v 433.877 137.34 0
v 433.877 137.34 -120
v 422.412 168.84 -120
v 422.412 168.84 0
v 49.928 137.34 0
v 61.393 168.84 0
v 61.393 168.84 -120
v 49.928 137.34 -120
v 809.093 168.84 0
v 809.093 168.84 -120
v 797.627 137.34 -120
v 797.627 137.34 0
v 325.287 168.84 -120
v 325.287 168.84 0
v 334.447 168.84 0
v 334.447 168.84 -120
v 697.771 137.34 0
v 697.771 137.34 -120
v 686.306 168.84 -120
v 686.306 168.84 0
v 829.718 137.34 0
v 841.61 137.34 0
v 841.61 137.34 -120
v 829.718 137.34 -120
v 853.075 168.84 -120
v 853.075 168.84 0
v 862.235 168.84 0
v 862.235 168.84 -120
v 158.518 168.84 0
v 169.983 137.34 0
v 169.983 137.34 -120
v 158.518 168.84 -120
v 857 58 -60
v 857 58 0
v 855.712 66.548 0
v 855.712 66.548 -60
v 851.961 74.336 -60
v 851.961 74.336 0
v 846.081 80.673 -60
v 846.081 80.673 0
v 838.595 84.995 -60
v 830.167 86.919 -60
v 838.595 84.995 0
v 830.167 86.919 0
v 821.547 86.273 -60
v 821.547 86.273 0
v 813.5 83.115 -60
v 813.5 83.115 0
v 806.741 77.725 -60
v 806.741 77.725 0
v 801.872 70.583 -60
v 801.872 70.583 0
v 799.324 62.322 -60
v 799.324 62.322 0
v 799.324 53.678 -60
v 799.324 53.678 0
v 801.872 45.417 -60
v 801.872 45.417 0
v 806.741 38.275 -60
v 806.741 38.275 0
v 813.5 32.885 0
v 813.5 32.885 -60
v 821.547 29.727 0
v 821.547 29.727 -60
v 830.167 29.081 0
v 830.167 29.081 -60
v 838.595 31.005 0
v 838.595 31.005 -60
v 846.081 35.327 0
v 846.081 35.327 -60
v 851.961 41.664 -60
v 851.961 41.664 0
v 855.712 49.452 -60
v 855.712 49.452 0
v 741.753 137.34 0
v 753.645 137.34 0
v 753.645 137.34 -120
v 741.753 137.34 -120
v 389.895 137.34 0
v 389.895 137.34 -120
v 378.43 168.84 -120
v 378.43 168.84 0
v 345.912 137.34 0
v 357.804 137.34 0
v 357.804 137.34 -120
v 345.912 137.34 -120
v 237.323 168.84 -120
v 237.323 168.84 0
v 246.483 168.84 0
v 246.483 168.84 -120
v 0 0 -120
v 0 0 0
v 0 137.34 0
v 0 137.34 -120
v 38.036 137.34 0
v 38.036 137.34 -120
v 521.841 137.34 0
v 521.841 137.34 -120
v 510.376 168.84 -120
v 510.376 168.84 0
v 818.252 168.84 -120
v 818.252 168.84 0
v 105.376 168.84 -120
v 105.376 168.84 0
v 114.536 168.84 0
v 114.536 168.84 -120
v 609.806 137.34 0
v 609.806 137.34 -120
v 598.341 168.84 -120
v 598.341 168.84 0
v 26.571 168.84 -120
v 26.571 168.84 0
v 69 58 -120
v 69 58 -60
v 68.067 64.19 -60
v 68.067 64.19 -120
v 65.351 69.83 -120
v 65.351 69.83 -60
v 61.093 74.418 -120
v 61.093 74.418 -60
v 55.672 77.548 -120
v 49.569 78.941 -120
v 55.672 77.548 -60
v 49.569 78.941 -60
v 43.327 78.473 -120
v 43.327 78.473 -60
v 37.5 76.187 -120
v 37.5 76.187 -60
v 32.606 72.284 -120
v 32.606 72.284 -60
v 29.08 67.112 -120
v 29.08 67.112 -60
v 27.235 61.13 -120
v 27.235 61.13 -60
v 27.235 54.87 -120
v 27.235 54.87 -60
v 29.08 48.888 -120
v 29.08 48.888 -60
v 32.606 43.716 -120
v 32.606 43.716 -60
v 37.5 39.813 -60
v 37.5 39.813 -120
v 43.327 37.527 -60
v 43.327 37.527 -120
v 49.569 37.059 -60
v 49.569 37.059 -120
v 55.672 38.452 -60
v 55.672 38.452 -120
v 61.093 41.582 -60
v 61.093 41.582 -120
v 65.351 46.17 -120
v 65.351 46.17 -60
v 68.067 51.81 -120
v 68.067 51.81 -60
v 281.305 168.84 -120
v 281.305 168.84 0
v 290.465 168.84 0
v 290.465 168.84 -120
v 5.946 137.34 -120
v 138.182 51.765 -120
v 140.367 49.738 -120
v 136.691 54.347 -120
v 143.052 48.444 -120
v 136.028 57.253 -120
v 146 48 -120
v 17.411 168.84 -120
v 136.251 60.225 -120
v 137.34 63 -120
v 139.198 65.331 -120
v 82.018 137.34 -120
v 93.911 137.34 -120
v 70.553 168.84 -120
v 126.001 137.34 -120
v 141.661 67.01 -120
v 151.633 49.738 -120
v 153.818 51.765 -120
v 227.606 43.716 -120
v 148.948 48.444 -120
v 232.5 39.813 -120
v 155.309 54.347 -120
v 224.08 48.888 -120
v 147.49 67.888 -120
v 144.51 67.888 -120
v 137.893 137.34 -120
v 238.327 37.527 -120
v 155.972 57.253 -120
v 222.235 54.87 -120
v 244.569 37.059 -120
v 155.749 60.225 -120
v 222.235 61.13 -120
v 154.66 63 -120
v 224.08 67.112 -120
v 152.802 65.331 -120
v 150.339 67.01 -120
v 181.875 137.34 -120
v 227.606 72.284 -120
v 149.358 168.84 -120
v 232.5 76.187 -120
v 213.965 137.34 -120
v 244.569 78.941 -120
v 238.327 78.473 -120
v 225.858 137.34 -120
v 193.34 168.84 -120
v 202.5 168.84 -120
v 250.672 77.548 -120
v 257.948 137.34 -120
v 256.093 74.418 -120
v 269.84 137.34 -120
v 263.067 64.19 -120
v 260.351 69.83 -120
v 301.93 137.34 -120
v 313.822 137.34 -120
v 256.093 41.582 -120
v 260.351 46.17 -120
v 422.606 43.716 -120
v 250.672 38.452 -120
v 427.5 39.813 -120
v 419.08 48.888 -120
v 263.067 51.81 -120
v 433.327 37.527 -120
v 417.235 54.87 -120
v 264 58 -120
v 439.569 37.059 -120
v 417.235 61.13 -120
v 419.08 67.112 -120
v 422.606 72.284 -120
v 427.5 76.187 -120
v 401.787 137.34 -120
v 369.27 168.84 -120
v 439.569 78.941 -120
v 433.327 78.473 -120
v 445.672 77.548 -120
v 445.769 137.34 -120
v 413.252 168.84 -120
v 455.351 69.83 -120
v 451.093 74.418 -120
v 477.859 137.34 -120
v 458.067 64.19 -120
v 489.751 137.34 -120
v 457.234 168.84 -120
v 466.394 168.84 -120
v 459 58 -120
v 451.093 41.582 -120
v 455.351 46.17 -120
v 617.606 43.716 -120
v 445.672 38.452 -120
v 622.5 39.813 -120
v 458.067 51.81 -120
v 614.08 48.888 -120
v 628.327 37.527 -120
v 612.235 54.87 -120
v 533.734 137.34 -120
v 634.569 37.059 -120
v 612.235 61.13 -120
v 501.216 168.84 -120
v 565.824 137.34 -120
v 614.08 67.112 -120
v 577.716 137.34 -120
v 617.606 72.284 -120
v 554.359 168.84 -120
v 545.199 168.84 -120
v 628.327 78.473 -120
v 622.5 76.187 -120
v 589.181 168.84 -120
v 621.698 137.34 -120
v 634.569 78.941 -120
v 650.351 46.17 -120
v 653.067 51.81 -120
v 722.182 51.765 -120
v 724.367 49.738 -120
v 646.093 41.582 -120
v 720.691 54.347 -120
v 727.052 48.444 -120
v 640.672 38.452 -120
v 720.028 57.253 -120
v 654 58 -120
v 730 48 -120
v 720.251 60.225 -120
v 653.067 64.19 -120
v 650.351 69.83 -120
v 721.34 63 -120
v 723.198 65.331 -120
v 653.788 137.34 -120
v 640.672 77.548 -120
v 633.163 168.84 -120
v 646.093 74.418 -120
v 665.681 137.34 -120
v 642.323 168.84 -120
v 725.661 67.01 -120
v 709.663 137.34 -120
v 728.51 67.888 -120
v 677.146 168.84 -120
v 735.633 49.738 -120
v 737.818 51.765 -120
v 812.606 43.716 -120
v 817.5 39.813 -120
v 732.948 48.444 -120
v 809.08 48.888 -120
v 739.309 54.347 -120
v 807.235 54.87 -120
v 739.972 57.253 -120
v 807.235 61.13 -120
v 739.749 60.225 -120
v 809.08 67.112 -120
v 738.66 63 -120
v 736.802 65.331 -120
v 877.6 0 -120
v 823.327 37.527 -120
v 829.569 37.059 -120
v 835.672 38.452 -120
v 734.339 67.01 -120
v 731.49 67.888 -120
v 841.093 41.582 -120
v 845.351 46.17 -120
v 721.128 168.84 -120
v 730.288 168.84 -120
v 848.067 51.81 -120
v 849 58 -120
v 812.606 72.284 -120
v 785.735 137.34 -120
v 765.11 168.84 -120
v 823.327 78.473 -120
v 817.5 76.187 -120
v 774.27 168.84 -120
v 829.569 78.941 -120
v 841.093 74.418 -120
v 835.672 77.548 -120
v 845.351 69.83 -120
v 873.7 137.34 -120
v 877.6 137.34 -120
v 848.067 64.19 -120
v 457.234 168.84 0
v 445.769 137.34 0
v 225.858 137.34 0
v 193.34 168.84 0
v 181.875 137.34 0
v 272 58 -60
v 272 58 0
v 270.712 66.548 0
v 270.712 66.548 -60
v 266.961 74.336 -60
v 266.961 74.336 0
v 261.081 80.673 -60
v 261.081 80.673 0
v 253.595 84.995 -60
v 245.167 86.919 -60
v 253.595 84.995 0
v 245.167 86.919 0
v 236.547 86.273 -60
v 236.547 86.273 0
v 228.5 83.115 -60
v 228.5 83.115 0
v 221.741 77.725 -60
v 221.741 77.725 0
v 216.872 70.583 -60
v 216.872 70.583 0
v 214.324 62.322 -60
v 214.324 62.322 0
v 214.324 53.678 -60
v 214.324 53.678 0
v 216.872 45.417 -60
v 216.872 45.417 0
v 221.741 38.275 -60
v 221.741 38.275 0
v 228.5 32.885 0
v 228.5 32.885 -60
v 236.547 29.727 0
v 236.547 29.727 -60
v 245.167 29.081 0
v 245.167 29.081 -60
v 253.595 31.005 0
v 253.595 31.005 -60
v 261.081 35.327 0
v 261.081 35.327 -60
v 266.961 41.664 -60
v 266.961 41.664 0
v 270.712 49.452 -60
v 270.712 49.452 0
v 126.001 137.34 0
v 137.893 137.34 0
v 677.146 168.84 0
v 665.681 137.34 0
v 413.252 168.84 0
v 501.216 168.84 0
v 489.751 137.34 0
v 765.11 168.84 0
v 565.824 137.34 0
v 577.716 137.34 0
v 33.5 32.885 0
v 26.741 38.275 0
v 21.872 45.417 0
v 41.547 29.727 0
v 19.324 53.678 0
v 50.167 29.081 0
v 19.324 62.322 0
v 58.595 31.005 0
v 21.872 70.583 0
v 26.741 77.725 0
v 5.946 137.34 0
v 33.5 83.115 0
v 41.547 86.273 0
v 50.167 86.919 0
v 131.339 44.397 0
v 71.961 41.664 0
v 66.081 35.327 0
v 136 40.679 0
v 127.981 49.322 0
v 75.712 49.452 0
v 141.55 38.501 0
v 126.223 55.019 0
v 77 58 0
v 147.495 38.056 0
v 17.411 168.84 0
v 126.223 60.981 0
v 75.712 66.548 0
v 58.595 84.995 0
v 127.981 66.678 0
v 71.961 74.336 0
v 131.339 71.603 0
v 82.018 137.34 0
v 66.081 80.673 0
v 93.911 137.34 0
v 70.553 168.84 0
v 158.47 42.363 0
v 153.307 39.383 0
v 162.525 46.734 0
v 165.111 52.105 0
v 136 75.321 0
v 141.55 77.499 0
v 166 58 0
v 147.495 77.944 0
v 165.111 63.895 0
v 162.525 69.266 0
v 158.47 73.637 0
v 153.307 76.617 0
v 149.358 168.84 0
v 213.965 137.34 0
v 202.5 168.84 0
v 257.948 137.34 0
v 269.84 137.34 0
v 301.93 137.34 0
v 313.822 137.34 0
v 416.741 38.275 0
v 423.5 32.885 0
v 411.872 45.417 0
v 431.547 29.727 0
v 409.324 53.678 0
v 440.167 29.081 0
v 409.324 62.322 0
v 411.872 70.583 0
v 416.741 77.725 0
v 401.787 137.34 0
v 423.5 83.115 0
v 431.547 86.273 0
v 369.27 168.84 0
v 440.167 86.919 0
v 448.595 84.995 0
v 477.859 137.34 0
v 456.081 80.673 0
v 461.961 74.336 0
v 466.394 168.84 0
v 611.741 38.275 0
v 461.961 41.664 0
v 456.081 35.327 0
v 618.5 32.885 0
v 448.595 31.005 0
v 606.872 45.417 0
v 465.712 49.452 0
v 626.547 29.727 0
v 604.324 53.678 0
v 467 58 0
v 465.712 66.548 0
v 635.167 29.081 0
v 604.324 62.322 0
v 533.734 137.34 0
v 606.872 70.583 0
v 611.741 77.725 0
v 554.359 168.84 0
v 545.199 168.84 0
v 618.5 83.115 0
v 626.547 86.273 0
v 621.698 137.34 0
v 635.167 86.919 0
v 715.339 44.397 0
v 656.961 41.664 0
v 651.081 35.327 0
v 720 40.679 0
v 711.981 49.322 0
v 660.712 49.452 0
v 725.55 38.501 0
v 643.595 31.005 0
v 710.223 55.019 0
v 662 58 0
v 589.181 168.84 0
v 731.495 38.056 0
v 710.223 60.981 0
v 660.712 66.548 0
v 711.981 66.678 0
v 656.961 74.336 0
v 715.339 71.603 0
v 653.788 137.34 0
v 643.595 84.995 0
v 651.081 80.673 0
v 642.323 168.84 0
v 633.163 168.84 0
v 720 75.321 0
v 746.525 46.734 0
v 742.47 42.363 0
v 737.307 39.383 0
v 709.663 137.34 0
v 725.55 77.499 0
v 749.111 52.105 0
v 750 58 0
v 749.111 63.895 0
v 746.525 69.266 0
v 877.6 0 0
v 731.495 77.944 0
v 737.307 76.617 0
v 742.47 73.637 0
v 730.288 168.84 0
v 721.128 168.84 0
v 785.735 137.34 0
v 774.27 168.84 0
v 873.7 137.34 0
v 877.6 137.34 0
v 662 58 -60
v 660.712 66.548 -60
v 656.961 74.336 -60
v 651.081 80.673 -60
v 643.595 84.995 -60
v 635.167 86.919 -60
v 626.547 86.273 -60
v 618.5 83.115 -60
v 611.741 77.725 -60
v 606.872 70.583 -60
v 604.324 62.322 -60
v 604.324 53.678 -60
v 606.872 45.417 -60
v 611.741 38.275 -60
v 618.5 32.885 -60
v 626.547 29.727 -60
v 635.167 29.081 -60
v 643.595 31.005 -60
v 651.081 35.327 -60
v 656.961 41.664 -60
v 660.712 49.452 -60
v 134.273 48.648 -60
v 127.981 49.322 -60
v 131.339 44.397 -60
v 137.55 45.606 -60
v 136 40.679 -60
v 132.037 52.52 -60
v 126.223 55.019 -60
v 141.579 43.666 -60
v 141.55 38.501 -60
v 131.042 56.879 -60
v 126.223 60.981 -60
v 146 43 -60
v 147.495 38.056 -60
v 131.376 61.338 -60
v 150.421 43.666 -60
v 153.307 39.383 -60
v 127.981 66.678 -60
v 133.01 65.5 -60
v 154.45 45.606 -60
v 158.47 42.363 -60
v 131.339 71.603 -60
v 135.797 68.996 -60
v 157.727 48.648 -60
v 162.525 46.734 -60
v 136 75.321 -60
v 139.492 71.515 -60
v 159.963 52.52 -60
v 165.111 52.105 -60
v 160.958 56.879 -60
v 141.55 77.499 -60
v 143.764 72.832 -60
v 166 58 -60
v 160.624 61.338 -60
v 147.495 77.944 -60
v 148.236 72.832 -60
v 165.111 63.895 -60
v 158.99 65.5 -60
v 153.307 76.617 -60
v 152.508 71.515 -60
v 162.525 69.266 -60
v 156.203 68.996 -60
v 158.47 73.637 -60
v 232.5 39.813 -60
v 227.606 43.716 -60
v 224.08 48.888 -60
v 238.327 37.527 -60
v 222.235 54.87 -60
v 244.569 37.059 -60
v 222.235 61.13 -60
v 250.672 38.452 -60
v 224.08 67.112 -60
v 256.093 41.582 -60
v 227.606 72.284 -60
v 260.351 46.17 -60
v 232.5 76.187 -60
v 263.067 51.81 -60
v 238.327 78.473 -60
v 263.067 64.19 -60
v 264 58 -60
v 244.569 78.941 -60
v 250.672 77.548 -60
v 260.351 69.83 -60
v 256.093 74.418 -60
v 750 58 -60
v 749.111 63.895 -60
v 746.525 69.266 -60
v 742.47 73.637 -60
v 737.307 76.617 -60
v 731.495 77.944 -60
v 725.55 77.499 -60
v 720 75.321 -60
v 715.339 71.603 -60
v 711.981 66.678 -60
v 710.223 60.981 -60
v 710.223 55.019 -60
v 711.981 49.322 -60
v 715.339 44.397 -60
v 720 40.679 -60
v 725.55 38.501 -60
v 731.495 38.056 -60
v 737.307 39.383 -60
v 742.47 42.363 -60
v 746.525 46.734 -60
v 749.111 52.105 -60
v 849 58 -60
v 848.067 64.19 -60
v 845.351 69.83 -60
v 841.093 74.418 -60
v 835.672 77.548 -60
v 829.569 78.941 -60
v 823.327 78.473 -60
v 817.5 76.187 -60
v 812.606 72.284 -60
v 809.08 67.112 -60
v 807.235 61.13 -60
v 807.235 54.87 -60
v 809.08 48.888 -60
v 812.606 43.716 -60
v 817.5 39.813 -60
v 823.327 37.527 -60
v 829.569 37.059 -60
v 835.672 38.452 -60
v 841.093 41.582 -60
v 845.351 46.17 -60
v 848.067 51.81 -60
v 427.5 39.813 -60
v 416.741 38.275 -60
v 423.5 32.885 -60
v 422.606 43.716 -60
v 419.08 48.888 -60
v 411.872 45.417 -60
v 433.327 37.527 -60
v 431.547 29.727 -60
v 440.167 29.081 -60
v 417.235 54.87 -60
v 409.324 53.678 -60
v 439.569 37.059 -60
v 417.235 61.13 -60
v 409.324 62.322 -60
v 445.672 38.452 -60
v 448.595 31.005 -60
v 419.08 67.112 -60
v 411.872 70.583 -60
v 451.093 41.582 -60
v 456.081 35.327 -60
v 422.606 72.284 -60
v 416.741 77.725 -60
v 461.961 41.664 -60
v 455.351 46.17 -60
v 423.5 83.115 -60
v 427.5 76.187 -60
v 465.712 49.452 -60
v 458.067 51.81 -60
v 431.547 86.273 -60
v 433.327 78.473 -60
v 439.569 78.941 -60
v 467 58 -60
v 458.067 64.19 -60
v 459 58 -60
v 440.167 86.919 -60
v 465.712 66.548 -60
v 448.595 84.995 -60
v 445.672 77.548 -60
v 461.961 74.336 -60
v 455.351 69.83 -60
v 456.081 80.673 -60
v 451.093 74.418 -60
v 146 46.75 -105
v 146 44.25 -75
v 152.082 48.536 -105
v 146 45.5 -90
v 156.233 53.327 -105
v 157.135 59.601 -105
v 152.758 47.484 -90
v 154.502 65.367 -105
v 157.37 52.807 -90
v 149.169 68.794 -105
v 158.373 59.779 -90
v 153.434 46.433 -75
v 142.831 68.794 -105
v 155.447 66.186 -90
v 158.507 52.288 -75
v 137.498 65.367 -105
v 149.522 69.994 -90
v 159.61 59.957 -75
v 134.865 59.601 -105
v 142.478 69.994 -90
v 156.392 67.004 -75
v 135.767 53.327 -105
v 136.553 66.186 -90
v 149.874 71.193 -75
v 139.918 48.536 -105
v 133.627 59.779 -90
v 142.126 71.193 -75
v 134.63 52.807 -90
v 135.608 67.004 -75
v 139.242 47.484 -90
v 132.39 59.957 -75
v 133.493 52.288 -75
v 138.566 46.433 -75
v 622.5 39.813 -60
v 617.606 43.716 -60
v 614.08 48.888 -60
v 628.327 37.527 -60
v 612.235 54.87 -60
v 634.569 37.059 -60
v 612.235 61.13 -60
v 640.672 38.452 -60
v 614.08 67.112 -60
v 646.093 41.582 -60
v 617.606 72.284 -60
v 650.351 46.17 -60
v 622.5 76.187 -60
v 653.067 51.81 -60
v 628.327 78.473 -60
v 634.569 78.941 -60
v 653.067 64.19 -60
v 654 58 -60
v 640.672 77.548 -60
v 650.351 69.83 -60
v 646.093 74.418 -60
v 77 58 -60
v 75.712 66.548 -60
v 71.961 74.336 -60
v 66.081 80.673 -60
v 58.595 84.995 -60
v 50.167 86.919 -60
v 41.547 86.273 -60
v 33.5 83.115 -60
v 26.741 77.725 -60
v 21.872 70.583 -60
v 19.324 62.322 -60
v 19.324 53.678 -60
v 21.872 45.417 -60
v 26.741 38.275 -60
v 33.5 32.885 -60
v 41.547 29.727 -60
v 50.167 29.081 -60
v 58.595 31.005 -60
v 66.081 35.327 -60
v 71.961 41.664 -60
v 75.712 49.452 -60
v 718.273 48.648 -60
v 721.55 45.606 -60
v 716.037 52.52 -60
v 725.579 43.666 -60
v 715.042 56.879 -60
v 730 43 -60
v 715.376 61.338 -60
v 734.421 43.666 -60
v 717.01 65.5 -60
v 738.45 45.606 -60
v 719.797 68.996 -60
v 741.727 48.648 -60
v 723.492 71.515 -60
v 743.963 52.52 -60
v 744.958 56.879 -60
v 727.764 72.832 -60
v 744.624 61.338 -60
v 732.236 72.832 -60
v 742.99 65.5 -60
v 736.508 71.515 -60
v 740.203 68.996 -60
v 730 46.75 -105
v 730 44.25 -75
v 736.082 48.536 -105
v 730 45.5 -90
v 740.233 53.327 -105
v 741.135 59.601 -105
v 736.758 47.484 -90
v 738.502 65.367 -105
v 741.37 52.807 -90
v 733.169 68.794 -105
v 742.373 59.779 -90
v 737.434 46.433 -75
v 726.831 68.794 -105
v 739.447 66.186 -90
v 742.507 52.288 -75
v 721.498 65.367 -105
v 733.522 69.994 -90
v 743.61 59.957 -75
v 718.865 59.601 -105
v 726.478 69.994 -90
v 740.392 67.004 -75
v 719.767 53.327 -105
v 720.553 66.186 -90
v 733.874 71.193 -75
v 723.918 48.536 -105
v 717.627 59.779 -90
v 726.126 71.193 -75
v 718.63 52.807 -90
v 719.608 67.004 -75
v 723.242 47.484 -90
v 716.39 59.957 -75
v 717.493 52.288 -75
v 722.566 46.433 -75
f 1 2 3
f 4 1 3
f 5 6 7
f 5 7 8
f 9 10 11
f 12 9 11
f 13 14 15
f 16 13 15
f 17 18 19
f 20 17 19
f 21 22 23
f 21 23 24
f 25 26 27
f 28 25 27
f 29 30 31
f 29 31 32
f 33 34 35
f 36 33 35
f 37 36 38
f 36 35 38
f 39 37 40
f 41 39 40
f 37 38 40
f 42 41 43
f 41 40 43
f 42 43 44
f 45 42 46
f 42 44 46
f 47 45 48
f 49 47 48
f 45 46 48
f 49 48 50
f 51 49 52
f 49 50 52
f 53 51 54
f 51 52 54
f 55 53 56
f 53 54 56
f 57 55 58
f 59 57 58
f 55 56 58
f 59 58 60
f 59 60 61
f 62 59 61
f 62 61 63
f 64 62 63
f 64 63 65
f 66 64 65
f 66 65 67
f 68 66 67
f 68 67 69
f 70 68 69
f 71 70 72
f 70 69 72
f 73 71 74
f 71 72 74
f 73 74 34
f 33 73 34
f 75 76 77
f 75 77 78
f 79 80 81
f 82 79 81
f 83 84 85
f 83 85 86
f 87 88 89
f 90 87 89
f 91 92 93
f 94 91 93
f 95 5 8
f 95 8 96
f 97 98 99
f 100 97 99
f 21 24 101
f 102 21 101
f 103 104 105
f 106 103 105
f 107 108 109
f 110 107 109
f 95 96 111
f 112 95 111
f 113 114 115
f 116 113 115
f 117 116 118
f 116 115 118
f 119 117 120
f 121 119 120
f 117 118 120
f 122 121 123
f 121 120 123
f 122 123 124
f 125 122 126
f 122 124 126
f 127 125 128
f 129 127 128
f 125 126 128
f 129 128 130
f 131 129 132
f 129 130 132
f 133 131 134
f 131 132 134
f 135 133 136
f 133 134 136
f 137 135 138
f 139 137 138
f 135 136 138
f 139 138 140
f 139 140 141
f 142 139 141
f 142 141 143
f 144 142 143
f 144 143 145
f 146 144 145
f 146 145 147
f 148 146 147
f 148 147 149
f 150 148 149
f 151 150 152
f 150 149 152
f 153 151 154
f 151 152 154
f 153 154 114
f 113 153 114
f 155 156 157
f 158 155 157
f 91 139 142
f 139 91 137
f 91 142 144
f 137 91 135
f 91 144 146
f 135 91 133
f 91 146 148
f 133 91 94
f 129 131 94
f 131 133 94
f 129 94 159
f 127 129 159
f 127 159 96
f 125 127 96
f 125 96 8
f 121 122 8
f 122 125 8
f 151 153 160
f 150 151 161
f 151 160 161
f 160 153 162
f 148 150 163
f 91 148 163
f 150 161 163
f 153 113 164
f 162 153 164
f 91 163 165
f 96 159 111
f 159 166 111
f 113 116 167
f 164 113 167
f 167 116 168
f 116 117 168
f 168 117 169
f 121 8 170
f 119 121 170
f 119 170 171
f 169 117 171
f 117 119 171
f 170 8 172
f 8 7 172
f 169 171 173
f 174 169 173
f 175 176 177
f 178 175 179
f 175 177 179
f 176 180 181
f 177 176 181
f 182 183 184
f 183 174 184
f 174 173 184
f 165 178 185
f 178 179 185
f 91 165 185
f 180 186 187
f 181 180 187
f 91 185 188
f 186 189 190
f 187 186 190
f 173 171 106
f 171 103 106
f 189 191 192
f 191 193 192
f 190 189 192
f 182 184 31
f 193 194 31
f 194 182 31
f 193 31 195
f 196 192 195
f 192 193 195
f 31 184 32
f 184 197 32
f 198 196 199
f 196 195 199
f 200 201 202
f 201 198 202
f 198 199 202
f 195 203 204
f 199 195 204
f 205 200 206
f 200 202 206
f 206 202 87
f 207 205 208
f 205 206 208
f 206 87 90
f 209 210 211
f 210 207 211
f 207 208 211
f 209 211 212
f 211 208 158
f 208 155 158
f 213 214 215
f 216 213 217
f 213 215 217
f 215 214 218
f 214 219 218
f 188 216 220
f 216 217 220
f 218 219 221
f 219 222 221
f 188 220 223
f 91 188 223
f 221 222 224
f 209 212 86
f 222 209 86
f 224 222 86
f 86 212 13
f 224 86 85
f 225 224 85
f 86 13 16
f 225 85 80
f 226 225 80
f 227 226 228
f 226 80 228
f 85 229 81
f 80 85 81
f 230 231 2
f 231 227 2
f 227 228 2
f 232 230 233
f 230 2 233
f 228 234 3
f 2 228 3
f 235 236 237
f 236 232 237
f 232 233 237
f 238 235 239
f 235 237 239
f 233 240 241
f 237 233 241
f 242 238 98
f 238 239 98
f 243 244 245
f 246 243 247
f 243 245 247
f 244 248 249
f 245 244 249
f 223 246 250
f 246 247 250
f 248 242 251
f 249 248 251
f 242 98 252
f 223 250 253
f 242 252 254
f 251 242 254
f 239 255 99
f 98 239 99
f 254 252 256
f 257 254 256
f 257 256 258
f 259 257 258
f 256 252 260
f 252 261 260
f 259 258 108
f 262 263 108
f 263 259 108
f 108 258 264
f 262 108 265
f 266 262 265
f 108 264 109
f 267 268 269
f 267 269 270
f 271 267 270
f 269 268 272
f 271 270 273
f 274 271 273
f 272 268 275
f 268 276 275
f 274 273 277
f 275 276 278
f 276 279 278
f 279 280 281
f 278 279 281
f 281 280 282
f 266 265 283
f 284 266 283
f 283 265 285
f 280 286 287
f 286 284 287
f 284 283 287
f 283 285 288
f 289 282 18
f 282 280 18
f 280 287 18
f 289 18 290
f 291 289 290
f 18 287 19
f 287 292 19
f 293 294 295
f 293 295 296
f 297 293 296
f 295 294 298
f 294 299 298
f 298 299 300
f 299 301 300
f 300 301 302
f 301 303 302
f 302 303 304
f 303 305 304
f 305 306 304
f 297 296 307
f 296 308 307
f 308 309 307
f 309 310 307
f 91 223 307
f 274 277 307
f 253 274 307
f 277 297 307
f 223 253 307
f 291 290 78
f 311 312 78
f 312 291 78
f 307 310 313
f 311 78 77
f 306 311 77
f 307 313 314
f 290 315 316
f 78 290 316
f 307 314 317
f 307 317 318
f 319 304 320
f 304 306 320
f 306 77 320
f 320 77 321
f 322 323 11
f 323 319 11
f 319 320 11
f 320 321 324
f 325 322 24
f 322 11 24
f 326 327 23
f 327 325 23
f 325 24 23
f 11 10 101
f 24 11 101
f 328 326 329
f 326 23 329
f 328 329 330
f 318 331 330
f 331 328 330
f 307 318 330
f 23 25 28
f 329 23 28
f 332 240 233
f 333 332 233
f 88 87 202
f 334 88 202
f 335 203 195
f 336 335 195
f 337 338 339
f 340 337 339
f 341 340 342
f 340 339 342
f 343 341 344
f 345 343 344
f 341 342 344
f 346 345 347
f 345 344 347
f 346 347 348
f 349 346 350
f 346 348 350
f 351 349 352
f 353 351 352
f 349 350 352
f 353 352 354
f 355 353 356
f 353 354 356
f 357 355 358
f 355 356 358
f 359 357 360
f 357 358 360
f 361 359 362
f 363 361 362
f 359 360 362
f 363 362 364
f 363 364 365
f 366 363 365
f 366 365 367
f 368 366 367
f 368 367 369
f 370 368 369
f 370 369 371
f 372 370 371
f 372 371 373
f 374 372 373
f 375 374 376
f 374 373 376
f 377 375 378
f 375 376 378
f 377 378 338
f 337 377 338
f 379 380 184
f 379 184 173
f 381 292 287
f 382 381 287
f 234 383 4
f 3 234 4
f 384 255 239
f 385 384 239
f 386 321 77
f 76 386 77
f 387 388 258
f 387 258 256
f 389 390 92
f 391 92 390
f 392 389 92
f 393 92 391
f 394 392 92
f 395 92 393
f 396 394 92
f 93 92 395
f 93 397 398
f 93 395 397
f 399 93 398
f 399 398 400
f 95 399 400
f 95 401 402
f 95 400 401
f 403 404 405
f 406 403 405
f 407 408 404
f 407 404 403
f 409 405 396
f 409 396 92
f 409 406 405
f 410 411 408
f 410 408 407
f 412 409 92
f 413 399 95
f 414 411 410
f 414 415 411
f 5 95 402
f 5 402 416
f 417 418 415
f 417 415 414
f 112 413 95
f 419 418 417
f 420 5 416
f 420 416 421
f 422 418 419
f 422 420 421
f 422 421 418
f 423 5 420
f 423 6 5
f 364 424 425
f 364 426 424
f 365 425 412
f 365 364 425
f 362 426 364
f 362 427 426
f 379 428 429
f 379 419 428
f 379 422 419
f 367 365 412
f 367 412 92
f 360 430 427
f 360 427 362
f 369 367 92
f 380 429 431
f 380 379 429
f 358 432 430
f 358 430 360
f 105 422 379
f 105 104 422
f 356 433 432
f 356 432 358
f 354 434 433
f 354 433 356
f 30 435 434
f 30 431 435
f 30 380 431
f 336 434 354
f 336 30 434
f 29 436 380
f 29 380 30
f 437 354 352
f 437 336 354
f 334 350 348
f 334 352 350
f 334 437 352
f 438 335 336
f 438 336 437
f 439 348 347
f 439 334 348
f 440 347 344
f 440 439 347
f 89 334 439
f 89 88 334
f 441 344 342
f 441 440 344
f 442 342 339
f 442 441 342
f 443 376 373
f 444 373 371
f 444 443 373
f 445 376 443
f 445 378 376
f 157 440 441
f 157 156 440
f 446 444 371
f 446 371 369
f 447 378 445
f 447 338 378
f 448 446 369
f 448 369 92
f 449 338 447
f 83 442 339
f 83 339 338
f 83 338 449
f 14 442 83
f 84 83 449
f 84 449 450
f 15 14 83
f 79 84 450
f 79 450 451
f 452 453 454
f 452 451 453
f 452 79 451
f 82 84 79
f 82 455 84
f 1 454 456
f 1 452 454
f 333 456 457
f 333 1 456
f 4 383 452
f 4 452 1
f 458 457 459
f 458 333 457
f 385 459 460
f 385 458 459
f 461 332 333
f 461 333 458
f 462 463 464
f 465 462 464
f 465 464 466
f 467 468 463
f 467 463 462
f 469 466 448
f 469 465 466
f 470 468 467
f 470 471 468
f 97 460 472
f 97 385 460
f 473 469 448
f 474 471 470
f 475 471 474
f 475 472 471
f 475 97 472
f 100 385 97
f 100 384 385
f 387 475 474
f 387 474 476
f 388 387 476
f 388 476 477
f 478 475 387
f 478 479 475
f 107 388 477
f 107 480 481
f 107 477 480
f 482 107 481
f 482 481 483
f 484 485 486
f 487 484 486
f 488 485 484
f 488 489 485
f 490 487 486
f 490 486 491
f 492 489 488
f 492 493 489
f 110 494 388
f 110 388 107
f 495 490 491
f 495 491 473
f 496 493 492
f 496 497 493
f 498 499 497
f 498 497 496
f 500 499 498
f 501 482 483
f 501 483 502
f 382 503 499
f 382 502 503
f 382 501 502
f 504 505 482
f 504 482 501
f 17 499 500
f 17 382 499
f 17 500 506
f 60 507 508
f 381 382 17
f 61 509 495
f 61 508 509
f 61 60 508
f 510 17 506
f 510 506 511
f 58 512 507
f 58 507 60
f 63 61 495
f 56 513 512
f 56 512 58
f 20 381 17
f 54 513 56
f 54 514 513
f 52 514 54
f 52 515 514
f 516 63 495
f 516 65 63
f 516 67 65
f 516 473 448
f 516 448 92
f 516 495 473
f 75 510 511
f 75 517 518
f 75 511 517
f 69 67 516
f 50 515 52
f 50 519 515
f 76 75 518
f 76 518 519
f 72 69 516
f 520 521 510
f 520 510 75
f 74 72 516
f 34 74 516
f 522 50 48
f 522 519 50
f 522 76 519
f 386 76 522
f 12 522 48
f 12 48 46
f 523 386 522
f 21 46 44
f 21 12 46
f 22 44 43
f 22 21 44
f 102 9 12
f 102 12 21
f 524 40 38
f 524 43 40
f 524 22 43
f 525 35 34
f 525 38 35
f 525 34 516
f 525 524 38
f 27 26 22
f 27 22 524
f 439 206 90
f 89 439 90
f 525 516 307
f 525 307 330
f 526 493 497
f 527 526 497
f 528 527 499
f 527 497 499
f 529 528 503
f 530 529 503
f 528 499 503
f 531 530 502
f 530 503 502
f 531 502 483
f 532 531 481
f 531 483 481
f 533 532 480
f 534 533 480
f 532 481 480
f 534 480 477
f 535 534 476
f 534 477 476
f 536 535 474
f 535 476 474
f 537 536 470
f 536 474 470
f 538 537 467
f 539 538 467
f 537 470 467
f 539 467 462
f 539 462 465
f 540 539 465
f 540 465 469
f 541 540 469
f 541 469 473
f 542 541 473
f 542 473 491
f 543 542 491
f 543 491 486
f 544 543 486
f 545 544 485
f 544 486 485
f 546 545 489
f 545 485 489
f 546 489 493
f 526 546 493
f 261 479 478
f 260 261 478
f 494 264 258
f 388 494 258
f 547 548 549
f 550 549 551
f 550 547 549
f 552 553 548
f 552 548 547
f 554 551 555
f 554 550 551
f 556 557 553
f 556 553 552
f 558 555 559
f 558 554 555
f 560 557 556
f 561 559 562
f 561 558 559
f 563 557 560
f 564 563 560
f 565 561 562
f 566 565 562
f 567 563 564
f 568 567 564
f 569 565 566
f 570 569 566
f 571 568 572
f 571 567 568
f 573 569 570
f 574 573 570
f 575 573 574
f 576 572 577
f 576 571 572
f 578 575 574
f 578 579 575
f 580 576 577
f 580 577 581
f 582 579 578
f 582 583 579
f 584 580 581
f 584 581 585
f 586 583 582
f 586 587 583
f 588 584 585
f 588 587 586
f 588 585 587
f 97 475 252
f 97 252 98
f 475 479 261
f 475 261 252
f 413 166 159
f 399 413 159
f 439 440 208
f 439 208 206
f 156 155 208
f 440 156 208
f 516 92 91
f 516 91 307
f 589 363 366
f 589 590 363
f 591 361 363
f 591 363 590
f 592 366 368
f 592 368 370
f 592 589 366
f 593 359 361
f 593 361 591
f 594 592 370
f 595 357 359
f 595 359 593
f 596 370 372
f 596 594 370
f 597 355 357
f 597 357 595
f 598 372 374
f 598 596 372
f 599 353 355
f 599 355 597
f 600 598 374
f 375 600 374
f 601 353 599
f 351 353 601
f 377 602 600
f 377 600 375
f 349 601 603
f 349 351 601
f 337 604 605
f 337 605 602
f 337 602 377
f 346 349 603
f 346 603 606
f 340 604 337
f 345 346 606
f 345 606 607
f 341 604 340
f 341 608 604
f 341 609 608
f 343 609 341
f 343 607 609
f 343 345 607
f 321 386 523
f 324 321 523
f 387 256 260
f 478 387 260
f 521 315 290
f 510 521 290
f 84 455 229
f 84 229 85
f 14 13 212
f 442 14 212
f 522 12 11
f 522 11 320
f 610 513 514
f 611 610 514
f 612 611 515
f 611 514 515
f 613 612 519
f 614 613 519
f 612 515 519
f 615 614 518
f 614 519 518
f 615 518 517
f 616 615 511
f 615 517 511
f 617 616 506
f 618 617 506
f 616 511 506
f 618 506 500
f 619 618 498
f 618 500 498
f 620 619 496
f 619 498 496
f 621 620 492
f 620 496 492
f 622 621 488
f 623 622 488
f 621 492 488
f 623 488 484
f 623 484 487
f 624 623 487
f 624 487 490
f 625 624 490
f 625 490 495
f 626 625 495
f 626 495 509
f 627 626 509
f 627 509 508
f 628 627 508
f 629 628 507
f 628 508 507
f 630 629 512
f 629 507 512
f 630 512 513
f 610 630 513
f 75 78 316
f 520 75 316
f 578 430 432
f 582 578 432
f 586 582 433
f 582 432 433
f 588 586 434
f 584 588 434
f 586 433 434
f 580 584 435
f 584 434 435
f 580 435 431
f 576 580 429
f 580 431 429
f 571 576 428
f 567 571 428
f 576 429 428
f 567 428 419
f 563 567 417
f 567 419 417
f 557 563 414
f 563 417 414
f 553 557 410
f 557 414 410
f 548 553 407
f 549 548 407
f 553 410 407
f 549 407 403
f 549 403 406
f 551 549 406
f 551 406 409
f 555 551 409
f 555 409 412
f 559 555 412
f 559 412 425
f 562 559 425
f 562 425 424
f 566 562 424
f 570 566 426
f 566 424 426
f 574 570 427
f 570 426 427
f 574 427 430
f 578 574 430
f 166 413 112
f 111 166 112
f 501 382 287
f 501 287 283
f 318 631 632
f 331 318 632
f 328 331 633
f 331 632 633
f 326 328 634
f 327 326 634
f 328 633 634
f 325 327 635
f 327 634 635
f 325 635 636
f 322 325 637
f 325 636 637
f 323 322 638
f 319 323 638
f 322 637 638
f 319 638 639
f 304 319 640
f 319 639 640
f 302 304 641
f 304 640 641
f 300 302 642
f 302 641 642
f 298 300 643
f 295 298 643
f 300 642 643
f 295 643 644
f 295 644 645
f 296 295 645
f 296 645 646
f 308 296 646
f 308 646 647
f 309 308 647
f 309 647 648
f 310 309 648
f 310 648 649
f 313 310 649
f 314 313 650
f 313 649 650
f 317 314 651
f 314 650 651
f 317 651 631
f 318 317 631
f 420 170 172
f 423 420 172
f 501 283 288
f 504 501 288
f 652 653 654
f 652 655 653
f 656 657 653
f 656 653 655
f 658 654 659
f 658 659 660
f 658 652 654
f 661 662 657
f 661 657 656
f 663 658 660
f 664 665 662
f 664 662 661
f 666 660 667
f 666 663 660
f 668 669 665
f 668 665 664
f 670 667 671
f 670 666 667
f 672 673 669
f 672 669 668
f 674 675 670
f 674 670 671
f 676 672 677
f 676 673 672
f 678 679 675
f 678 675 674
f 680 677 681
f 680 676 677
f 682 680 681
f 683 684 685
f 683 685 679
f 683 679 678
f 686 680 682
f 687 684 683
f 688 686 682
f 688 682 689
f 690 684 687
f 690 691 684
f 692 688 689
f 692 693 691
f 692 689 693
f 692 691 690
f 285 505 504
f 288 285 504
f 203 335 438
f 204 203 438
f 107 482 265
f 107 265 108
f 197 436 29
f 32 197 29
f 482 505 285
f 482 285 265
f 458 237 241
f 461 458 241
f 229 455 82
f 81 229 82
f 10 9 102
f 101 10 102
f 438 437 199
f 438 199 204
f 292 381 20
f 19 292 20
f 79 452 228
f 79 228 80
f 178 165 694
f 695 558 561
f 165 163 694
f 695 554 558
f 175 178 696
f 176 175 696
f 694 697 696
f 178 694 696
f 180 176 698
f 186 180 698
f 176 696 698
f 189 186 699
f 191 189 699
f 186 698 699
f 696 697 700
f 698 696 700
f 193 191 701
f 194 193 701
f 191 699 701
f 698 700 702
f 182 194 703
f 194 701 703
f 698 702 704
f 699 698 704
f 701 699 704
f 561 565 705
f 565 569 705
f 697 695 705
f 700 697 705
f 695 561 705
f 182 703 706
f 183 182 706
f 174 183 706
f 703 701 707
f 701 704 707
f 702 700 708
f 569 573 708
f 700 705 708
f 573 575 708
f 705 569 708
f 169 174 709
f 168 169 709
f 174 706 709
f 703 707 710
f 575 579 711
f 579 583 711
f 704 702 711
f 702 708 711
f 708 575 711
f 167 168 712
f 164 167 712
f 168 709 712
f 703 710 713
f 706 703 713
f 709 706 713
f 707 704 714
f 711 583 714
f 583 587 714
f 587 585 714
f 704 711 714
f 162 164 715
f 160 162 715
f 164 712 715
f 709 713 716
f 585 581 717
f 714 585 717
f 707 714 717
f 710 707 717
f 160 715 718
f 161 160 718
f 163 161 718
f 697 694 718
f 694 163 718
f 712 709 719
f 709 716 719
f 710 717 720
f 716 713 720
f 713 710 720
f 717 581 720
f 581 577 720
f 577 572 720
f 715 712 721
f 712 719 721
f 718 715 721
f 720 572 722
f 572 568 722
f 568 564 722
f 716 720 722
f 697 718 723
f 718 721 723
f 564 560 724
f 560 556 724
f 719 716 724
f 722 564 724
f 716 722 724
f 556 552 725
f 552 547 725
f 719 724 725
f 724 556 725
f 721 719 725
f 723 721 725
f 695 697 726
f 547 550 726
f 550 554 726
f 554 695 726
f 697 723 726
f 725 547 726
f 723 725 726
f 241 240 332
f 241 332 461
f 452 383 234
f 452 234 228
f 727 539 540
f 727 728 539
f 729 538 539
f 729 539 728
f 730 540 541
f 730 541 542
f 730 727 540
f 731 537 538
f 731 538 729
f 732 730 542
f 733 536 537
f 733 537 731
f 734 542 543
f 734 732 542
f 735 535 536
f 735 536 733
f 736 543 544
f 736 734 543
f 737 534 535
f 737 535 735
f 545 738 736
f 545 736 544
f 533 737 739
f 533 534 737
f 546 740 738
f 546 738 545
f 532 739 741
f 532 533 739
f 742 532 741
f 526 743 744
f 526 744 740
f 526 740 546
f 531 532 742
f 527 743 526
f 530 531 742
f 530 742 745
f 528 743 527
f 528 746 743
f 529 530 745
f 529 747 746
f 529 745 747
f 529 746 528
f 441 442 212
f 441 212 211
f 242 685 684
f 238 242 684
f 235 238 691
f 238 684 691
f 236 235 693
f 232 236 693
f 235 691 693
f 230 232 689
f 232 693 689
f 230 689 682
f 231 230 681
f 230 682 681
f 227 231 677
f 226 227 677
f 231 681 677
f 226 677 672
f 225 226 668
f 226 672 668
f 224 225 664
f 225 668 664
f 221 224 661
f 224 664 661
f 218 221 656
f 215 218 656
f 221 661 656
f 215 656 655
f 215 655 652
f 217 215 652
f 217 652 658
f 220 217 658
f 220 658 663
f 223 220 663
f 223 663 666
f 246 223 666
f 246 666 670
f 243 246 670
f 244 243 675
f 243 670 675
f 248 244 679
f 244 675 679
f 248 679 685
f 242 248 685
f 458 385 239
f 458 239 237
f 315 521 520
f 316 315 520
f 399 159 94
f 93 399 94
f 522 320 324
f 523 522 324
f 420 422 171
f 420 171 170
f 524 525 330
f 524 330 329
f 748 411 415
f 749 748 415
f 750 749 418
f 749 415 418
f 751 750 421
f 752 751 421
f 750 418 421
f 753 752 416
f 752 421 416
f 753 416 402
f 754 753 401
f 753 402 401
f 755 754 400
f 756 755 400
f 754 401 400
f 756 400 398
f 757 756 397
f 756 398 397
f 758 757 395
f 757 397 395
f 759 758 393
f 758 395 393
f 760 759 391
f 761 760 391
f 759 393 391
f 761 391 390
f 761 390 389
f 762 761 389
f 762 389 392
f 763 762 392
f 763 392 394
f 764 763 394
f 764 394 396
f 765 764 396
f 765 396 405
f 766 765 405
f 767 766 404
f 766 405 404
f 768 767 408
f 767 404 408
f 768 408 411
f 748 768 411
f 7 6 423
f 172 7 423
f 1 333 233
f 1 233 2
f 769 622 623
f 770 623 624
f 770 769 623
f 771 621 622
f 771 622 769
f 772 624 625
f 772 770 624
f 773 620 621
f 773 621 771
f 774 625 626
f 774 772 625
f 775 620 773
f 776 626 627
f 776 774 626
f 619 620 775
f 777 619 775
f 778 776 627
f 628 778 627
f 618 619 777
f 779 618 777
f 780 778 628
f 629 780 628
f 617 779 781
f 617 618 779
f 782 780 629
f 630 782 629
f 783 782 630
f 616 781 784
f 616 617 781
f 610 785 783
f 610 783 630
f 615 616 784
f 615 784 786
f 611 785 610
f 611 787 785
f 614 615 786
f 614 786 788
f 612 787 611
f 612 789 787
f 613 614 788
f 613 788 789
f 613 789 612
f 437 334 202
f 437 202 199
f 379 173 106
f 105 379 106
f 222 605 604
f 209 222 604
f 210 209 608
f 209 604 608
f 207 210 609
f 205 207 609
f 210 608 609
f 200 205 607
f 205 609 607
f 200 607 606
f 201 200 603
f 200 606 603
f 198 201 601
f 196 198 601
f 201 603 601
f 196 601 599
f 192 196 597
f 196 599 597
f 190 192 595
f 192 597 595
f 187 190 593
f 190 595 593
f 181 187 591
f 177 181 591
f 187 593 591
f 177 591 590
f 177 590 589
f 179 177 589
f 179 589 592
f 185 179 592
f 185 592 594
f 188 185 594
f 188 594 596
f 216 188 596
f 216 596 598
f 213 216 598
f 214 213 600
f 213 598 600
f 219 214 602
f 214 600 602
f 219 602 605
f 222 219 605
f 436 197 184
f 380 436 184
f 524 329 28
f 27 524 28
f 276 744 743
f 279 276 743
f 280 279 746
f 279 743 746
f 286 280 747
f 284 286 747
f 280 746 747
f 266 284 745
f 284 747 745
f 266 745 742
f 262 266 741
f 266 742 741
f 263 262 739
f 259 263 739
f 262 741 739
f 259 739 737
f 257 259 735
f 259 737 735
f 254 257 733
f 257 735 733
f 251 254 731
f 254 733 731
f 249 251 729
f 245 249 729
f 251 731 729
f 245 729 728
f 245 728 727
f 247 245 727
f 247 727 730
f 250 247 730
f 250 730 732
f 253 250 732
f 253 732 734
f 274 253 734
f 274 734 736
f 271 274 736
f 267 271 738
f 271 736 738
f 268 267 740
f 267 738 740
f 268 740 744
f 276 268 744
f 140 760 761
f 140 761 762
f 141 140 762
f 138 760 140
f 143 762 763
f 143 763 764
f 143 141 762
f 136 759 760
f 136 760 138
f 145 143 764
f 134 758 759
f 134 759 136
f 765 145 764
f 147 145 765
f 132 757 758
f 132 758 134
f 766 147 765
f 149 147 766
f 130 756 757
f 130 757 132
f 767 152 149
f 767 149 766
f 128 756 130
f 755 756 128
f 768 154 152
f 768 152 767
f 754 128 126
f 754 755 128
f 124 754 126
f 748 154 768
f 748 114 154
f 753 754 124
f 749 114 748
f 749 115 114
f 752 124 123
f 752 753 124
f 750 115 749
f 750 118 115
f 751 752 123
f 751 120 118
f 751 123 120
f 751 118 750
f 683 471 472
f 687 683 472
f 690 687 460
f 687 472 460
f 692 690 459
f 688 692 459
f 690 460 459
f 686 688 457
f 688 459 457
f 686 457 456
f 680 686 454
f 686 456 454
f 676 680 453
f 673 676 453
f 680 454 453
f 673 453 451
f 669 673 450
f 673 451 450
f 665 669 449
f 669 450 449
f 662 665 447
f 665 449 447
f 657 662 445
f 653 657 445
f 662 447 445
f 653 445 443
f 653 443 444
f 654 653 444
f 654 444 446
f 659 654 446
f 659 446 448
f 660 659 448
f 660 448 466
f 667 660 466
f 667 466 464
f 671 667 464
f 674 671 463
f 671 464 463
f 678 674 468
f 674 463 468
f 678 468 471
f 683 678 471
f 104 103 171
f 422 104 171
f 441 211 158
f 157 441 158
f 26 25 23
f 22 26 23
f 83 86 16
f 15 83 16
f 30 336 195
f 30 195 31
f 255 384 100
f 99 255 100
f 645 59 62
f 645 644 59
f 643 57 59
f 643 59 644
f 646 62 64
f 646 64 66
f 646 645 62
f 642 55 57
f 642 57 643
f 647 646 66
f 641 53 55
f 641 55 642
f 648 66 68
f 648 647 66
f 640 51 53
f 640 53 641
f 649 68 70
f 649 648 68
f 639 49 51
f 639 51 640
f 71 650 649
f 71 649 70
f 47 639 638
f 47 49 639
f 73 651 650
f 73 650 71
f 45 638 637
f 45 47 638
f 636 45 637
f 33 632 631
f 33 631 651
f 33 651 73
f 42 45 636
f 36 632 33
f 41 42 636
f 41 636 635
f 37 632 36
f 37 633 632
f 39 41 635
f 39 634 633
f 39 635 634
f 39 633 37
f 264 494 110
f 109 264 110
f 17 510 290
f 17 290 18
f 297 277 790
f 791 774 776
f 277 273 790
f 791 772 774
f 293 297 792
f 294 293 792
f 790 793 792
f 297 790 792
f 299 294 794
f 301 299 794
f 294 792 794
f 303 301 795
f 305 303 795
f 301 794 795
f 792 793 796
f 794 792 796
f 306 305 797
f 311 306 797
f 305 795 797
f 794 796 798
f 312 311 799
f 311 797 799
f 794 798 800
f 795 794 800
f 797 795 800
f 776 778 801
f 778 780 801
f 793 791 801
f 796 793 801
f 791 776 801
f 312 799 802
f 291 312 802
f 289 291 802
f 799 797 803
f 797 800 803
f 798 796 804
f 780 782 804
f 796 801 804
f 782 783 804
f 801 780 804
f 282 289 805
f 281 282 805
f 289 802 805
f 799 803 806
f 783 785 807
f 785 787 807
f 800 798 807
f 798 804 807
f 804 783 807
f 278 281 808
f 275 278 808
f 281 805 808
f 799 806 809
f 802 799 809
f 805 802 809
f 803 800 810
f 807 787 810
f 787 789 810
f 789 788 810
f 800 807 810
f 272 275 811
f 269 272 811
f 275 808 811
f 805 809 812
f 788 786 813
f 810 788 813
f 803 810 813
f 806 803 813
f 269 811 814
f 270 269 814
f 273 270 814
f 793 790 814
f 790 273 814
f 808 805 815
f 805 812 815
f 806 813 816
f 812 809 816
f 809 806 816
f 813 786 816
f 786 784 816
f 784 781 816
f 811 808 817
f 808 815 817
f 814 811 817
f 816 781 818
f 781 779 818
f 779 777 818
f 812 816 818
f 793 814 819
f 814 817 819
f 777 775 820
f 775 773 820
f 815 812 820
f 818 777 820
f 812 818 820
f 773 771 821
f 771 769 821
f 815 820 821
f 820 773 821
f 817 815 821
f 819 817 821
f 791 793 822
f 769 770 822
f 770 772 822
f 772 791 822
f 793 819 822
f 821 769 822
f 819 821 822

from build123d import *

# Parameters (mm, degrees)
BLANKSKE_W               = 877.6
BLANKSKE_H               = 168.84
BLANK_DEPTH              = 120
TOOTHCUTSIM_DEPTH        = 902.714314847
TEETHCUTS_COUNT          = 21
TEETHCUTS_PITCH          = 43.9822971
SKETCH_1_R               = 29
SKETCH_1_R_2             = 20
CUT_EXTRUDE_2_DEPTH      = 60
SKETCH_2_R               = 21
CUT_EXTRUDE_3_DEPTH      = 60
HOLE_WIZARD_1_AT_2_COUNT = 2
HOLE_WIZARD_1_AT_2_PITCH = 584


with BuildPart() as part:
    # BlankSke → Blank (new body)
    with BuildSketch(Plane.XY):
        with Locations((438.8, 84.42)):
            Rectangle(BLANKSKE_W, BLANKSKE_H)
    extrude(amount=-BLANK_DEPTH)

    # TooCutSkeSim → ToothCutSim (cut, through all)
    with BuildSketch(Plane.XY):
        Polygon((5.946095175, 137.34), (-5.946095175, 137.34), (-17.420402399, 168.8654), (17.420402399, 168.8654), align=None)
    toothcutsim = extrude(amount=-TOOTHCUTSIM_DEPTH, mode=Mode.SUBTRACT)

    # TeethCuts: ToothCutSim ×21
    with Locations(*[(i * TEETHCUTS_PITCH, 0, 0) for i in range(1, TEETHCUTS_COUNT)]):
        add(toothcutsim, mode=Mode.SUBTRACT)

    # 草图1 → 切除-拉伸2 (cut)
    with BuildSketch(Plane.XY):
        with Locations((48, 58)):
            Circle(SKETCH_1_R)
        with Locations((146, 58)):
            Circle(SKETCH_1_R_2)
        with Locations((243, 58)):
            Circle(SKETCH_1_R)
        with Locations((438, 58)):
            Circle(SKETCH_1_R)
        with Locations((633, 58)):
            Circle(SKETCH_1_R)
        with Locations((730, 58)):
            Circle(SKETCH_1_R_2)
        with Locations((828, 58)):
            Circle(SKETCH_1_R)
    extrude(amount=-CUT_EXTRUDE_2_DEPTH, mode=Mode.SUBTRACT)

    # 草图2 → 切除-拉伸3 (cut)
    with BuildSketch(Plane.XY.offset(-60)):
        with Locations((48, 58)):
            Circle(SKETCH_2_R)
        with Locations((243, 58)):
            Circle(SKETCH_2_R)
        with Locations((438, 58)):
            Circle(SKETCH_2_R)
        with Locations((633, 58)):
            Circle(SKETCH_2_R)
        with Locations((828, 58)):
            Circle(SKETCH_2_R)
    extrude(amount=-CUT_EXTRUDE_3_DEPTH, mode=Mode.SUBTRACT)

    # 草图6 → 孔1 (revolve, cut)
    with BuildSketch(Plane(origin=(146, 58, -60), x_dir=(0, -1, 0), z_dir=(1, 0, 0))):
        Polygon((0, 0), (0, 60), (10, 60), (15, 0), align=None)
    hole_wizard_1 = revolve(axis=Axis((146, 58, -170), (0, 0, 1)), mode=Mode.SUBTRACT)

    # 孔1 at 2: 孔1 ×2
    with Locations(*[(i * HOLE_WIZARD_1_AT_2_PITCH, 0, 0) for i in range(1, HOLE_WIZARD_1_AT_2_COUNT)]):
        add(hole_wizard_1, mode=Mode.SUBTRACT)


solid = part.part
